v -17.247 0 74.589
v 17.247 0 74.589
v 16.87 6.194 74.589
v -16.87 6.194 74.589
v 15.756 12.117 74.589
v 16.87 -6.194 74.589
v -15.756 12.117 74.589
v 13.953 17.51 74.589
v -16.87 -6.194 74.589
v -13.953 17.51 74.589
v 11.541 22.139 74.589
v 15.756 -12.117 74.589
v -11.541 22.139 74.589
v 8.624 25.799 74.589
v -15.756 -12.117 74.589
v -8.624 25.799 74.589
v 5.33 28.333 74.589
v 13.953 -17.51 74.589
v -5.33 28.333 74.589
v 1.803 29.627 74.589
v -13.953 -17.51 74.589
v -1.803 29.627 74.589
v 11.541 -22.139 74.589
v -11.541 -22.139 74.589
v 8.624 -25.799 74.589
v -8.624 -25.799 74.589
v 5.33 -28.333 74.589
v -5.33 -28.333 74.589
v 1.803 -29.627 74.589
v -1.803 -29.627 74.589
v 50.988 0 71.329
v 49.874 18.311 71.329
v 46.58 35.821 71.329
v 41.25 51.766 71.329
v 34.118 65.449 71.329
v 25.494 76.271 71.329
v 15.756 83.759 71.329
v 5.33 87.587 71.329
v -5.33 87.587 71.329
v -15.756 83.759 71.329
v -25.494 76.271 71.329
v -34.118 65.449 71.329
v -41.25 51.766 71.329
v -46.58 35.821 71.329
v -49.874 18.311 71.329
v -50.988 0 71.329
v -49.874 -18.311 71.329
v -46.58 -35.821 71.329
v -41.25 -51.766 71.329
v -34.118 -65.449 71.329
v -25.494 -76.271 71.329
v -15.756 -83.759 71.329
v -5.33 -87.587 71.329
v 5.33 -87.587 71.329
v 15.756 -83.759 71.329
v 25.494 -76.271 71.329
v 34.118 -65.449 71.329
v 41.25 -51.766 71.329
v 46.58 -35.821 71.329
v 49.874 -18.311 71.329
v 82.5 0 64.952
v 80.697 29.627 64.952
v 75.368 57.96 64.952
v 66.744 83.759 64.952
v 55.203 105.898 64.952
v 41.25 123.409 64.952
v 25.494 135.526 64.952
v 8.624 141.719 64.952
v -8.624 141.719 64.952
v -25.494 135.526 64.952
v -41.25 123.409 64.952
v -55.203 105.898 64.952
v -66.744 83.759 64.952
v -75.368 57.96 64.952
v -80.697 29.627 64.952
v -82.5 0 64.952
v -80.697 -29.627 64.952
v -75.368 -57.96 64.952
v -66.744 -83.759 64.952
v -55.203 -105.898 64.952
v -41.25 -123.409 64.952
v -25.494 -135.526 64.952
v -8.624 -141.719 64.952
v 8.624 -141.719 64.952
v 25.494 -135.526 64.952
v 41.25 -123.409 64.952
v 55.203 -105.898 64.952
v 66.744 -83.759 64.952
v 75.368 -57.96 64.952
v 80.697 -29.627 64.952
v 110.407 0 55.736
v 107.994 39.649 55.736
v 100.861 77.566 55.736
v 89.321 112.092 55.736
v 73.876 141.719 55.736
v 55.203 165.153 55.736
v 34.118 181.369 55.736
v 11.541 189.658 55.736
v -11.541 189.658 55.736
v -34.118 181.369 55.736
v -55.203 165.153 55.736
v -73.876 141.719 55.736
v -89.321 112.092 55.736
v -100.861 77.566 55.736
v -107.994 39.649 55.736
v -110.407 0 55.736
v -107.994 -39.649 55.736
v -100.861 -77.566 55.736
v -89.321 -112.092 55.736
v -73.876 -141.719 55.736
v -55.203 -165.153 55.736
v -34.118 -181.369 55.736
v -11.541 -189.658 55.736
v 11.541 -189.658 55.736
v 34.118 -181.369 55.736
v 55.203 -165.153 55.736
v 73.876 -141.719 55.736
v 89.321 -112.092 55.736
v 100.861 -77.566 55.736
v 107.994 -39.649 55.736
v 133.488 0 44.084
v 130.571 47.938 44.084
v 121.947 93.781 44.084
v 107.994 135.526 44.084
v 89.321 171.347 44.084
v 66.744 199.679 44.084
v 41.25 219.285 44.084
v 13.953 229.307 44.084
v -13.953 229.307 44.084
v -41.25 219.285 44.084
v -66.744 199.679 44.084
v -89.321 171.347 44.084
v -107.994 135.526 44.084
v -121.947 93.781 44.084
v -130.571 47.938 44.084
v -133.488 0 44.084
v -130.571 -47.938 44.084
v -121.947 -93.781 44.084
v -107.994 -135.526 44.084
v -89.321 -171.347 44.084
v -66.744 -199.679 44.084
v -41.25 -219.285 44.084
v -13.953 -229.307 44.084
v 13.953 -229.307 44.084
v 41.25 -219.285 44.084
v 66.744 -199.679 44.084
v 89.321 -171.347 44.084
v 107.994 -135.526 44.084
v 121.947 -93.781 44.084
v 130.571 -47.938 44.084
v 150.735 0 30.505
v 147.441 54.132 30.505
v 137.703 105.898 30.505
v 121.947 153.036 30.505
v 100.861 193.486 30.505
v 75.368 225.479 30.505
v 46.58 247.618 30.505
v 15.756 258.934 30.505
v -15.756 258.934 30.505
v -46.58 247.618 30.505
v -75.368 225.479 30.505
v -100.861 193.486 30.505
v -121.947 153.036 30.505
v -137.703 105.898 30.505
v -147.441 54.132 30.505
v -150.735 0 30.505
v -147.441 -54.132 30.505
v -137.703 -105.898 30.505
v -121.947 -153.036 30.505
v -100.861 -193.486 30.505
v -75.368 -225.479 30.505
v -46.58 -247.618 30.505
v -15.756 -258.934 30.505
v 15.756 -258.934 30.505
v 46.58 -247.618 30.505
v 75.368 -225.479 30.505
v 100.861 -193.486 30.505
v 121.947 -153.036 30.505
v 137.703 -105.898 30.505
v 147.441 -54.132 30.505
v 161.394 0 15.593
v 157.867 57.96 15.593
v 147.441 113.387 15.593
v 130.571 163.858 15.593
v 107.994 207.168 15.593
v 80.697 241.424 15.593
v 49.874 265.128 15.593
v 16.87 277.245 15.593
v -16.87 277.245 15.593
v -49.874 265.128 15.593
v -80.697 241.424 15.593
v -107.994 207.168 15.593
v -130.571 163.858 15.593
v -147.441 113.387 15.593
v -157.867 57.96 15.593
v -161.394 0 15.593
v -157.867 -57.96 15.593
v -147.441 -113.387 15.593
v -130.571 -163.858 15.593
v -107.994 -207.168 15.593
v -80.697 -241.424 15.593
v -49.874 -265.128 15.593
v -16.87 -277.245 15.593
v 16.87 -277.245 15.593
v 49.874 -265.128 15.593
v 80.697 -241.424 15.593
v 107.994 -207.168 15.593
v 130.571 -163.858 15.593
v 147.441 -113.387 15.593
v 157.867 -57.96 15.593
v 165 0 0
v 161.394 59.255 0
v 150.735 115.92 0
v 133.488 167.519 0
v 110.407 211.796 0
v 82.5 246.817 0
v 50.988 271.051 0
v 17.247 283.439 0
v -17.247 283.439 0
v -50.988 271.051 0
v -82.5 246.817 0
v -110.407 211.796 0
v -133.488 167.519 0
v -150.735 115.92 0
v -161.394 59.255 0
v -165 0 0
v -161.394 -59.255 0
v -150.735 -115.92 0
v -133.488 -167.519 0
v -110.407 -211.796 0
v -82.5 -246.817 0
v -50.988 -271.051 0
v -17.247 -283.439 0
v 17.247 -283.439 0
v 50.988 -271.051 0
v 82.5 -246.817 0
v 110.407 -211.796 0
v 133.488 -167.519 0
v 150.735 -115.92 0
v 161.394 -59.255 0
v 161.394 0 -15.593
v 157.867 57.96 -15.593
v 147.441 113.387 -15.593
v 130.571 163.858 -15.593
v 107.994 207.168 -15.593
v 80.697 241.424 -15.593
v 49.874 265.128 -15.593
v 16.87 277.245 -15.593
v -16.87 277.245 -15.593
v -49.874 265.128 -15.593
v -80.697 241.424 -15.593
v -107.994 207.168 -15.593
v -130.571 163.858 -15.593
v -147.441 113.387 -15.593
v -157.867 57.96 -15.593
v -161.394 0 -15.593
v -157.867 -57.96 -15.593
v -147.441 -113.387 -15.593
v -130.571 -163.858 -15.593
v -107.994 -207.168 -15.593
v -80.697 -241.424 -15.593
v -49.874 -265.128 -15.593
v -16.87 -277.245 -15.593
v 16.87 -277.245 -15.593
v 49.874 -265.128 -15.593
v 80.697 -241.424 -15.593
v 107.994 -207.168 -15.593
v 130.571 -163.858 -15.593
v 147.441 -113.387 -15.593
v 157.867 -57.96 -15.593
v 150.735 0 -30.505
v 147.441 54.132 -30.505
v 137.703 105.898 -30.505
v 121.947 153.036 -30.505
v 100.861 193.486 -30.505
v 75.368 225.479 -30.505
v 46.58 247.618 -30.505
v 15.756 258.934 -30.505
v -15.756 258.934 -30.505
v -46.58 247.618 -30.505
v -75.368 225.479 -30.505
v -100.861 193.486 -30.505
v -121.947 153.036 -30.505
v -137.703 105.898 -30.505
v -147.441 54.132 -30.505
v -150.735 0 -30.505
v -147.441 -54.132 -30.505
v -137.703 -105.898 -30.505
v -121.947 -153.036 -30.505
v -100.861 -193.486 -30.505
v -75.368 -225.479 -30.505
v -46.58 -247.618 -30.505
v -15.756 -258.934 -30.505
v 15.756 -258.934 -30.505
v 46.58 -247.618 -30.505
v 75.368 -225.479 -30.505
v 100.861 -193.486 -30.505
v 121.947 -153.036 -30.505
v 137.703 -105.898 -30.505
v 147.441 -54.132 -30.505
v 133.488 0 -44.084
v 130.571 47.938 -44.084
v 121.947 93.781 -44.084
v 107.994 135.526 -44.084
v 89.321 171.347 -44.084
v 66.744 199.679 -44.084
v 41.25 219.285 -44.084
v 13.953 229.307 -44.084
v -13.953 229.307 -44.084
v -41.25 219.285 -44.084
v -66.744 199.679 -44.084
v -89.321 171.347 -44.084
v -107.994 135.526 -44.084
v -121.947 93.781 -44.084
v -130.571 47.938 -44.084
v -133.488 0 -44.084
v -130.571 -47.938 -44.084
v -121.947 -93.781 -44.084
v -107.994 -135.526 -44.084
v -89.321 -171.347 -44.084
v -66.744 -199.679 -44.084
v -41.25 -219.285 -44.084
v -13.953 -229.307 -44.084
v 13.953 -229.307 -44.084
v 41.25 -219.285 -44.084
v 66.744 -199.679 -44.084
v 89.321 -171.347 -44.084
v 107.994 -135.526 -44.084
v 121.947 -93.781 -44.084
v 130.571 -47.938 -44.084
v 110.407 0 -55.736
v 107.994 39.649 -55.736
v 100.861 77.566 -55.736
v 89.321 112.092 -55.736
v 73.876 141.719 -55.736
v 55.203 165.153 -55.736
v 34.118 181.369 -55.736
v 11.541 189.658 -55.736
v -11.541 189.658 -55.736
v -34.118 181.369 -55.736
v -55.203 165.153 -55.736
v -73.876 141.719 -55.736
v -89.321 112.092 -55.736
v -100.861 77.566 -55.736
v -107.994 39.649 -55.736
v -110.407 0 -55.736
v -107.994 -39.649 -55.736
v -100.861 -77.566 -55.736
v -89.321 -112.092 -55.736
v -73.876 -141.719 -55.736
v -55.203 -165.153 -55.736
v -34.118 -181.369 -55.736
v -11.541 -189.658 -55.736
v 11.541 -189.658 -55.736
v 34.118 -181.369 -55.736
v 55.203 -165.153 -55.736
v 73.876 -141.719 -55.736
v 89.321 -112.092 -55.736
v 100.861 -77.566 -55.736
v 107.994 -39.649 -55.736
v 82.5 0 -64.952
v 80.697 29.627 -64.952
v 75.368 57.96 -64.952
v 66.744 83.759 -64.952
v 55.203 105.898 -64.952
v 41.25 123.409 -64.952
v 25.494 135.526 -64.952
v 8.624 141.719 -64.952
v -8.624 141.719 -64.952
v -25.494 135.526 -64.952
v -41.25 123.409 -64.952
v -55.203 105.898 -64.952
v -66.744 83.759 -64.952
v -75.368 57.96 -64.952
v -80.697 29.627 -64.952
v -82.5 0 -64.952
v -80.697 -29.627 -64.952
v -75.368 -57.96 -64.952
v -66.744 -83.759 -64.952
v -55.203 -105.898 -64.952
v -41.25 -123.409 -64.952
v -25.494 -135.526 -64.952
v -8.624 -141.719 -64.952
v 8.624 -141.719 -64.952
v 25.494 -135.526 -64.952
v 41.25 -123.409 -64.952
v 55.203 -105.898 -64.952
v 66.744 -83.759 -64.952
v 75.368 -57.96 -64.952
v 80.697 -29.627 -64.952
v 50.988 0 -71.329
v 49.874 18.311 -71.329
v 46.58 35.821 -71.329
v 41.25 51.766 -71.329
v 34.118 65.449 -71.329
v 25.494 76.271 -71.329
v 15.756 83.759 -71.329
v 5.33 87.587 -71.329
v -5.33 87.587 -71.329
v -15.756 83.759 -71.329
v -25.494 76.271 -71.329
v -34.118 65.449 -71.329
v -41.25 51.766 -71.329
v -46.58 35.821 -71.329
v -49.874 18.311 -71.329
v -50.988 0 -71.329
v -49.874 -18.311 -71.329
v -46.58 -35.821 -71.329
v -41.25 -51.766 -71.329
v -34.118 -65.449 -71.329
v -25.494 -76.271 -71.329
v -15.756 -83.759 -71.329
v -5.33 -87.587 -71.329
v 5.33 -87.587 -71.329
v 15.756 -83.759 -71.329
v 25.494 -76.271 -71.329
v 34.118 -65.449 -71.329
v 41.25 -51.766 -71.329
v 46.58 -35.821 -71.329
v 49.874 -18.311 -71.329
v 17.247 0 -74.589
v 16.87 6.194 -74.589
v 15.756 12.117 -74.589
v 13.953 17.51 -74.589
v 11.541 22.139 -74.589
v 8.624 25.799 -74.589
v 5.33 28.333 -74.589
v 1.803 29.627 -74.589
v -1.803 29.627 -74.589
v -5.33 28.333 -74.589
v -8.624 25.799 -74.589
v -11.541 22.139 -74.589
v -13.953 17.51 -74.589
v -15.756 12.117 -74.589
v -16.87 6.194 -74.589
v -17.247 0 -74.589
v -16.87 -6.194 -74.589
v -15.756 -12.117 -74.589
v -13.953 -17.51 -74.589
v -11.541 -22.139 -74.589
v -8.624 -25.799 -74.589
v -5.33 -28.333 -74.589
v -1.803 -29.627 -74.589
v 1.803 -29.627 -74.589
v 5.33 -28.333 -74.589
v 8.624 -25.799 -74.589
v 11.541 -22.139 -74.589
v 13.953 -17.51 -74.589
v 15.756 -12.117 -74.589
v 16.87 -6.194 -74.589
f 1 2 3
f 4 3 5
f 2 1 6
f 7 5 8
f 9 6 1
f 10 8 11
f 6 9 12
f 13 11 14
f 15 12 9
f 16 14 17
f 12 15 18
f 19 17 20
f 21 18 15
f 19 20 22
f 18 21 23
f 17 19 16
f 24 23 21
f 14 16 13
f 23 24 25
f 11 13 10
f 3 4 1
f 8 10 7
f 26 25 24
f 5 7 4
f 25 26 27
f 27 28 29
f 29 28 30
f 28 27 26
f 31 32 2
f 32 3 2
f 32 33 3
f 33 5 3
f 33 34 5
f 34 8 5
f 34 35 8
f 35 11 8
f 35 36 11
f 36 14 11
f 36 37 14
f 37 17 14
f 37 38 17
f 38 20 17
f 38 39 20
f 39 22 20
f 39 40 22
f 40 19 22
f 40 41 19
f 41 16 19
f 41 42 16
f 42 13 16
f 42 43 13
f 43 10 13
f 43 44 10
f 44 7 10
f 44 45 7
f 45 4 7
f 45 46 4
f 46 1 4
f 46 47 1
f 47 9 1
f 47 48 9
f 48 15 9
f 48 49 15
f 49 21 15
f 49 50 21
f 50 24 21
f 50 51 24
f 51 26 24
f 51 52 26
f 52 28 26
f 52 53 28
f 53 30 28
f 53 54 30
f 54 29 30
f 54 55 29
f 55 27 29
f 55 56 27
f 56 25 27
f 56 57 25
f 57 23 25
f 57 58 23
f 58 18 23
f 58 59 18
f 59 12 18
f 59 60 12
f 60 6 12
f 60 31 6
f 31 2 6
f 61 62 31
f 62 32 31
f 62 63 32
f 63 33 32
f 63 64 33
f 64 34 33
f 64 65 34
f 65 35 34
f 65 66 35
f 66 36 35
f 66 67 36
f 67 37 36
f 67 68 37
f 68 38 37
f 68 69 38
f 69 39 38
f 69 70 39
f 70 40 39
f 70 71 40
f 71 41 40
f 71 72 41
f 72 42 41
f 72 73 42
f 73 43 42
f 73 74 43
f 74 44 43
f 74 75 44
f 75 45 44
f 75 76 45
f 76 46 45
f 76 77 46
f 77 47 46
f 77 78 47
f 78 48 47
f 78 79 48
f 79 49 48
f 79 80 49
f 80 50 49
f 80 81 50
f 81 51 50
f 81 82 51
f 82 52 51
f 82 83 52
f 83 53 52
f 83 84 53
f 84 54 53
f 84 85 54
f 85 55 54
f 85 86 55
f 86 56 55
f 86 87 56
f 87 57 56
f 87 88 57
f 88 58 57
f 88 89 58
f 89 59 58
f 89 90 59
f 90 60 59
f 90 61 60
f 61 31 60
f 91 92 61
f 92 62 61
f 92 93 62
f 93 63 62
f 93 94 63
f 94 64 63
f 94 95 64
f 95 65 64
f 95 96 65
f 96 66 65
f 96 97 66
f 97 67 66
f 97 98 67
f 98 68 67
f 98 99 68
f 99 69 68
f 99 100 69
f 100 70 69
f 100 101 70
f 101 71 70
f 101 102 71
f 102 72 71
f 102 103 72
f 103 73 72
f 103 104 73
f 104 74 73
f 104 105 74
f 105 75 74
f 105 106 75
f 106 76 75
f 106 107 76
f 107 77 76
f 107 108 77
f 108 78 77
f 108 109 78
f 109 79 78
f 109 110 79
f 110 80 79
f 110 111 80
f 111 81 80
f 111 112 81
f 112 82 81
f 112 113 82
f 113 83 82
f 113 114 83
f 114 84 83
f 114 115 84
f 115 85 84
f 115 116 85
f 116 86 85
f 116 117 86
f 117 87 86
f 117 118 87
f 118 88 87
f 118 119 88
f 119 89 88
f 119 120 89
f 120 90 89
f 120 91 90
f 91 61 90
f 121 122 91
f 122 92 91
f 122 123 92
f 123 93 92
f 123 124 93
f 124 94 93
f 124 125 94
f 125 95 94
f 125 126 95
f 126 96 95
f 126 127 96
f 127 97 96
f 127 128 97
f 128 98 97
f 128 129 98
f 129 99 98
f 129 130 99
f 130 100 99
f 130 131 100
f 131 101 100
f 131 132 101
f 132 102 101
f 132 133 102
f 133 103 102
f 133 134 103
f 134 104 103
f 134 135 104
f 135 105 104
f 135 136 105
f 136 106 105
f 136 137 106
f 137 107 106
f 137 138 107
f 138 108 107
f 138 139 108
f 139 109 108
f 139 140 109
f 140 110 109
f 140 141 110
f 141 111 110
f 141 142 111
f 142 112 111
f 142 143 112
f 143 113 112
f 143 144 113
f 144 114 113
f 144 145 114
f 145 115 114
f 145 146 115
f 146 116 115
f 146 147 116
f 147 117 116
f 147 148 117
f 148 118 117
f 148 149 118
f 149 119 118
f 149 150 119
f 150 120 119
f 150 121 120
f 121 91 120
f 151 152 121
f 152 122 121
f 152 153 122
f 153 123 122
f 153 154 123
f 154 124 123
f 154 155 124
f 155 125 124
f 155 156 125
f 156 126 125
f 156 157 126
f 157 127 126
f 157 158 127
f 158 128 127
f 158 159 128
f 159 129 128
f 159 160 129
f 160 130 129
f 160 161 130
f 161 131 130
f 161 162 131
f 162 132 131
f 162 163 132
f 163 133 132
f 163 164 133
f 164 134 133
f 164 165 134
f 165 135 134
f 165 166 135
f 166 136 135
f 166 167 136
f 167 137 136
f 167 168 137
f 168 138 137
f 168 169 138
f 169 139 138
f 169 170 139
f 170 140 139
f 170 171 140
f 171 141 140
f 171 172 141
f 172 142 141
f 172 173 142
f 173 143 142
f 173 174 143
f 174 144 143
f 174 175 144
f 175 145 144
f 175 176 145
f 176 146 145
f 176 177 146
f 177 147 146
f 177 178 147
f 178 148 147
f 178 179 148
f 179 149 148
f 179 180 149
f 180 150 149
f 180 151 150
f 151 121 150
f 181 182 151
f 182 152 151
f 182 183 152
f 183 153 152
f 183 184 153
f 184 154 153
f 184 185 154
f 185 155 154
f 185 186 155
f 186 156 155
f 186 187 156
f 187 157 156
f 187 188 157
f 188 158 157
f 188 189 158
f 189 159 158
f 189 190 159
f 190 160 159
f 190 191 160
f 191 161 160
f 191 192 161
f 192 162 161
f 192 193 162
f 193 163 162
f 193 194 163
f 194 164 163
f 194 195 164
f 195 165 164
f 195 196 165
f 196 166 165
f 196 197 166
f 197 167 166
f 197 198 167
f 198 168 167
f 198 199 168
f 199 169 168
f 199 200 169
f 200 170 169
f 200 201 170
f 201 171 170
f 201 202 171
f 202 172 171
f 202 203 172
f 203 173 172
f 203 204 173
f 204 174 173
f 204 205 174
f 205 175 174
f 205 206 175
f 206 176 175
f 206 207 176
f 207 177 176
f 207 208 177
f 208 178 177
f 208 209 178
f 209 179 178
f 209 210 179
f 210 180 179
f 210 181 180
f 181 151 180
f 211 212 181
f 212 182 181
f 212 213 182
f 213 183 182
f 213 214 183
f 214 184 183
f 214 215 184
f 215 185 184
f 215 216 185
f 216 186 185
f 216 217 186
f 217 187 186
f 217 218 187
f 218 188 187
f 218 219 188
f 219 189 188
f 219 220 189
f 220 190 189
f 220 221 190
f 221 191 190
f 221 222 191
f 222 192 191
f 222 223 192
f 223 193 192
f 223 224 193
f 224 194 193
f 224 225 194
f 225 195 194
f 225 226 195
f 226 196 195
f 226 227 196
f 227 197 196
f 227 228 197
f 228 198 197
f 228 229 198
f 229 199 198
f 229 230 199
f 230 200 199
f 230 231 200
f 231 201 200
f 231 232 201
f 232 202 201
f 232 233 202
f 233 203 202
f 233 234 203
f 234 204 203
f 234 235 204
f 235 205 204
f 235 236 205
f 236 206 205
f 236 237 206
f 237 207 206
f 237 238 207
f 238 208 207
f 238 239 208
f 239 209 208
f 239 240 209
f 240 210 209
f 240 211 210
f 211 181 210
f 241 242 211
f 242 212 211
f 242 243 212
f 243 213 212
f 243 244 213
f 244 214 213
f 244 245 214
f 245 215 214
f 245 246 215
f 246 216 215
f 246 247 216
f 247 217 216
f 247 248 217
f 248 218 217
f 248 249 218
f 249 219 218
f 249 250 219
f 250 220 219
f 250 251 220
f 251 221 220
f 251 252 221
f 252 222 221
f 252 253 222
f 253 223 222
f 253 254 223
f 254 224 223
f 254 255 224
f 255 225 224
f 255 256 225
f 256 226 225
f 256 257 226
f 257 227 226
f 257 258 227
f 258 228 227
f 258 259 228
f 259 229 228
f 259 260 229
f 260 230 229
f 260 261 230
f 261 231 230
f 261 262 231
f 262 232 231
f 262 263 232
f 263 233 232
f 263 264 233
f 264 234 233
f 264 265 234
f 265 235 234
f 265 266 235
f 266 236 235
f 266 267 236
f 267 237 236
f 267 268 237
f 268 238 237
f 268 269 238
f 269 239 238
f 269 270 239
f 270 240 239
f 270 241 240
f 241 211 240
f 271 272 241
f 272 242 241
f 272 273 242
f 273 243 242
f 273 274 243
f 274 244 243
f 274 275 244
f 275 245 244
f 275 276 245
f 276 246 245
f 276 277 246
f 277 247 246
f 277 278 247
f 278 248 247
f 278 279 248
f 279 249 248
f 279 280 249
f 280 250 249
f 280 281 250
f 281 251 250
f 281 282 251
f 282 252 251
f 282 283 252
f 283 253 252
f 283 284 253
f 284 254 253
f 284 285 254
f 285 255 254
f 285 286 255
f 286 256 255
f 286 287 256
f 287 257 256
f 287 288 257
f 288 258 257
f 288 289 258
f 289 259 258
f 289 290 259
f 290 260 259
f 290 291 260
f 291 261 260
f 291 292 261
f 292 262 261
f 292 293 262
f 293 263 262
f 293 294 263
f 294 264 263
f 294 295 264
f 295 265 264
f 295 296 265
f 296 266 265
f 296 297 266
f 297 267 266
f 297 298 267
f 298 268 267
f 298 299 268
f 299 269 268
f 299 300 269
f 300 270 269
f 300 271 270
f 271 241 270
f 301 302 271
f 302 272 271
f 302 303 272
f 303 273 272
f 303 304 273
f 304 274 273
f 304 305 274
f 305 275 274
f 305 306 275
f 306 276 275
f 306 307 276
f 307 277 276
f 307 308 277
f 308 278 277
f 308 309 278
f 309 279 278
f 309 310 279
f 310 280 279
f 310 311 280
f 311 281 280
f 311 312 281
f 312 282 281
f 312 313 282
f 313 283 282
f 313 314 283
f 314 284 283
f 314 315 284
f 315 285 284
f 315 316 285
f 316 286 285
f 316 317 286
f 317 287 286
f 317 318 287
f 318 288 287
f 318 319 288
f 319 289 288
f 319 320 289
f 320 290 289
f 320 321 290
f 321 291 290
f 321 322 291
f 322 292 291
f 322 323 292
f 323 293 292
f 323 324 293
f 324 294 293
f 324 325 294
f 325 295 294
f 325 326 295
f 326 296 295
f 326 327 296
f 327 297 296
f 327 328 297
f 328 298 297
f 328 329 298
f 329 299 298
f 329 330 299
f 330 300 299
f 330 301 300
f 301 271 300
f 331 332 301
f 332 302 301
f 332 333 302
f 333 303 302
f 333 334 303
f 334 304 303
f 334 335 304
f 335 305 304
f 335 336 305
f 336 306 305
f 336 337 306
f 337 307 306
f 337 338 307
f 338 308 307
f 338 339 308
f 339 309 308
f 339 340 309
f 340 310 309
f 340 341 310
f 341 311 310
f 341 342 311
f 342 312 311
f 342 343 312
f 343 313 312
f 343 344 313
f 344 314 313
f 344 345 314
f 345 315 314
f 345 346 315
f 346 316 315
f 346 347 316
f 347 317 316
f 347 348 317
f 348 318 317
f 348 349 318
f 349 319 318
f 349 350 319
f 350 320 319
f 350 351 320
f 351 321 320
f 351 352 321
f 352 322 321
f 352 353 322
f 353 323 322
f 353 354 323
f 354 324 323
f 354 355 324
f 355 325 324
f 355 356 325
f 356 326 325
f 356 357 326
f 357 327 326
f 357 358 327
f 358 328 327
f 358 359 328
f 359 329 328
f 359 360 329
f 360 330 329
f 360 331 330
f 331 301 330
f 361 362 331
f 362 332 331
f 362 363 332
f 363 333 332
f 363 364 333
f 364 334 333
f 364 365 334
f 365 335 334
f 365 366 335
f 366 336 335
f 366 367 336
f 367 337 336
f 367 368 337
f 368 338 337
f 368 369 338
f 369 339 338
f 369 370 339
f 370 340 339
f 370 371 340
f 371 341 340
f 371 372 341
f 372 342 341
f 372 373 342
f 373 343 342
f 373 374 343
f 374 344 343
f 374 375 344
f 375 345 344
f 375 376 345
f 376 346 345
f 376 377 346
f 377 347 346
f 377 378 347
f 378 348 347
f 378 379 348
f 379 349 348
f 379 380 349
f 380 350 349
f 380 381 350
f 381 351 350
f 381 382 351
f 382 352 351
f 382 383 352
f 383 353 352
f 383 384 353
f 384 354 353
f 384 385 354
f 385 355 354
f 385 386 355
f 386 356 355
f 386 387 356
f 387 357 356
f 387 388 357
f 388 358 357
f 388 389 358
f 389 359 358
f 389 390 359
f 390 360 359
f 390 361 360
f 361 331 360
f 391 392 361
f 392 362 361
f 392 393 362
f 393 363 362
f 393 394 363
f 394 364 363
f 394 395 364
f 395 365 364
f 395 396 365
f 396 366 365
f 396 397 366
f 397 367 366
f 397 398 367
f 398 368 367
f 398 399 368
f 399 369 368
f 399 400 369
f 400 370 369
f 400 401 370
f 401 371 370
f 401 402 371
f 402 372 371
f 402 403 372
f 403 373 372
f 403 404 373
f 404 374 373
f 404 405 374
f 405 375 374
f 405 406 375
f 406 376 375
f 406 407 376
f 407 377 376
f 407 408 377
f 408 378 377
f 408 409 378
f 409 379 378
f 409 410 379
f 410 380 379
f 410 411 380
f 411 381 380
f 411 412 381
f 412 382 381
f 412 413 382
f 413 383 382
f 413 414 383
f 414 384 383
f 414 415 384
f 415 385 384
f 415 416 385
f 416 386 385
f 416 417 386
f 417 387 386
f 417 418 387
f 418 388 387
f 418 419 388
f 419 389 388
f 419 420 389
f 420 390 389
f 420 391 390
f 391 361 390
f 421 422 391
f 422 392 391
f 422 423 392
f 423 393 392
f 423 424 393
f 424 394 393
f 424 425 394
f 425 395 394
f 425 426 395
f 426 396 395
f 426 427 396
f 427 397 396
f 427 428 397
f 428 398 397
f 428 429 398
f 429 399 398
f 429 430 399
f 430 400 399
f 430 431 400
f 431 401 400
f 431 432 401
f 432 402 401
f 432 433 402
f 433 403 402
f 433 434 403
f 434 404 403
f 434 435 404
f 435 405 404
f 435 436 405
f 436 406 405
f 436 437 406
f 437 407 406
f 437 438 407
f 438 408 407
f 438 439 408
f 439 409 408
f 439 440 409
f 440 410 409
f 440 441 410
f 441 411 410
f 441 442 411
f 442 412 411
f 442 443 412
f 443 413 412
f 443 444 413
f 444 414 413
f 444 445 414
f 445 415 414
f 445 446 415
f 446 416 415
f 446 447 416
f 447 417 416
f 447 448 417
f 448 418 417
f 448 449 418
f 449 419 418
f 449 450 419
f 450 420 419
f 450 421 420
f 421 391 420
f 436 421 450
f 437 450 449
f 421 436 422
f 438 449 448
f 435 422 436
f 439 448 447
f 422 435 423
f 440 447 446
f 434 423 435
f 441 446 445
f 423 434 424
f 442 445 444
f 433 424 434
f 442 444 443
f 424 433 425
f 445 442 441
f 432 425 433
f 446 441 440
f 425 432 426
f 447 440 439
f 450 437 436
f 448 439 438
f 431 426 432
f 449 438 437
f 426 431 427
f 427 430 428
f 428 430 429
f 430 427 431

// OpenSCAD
// Generated by SolidPython 1.0.1 on 2020-07-29 00:46:50


scale(v = [11, 19, 5]) {
	sphere(r = 15);
}
/***********************************************
*********      SolidPython code:      **********
************************************************
 
# import packages: SolidPython
from solid import *
from solid.utils import *
from itertools import chain, combinations, permutations


class Resize:

    def __init__(self, scad_file):
        self.scad_file = scad_file
        #self.scad_file = import_scad(scad_file)
        # cone/cylinder param:
        self.r1 = 0
        self.r2 = 0
        self.h = 0
        # rectangular prism param:
        self.w = 0
        self.l = 0
        # ellipse param:
        self.r = 0

    # import OpenScad code (file name corresponds to shape)


    # classify shape + parameters
    def assign(self, param1, param2, param3):
        if self.scad_file == 'cone.scad':
            self.r1 = param1
            self.r2 = param2
            self.h = param3
        elif self.scad_file == 'cylinder.scad':
            self.r1 = param1
            self.r2 = param2
            self.h = param3
        elif self.scad_file == 'rectangularPrism.scad':
            self.h = param1
            self.l = param2
            self.w = param3
        else:
            self.r = param1
            self.h = param2

    # resize parameters
    def iterate(self):
        x = range(3, 20, 2)
        i = 1
        if self.scad_file == 'cone.scad':
            tempList = list(permutations(x, 2))
            for temp in tempList:
                param1 = temp[0]
                param2 = temp[1]
                filepath = 'produced_scad_files/' + 'cone' + str(param1) + '_' + str(param2) + '_' + '.scad'
                scad_render_to_file(cylinder(h=param1, r1=param2, r2=0), filepath)

        elif self.scad_file == 'cylinder.scad':
            tempList = list(permutations(x, 3))
            for temp in tempList:
                param1 = temp[0]
                param2 = temp[1]
                filepath = 'produced_scad_files/' + 'cylinder' + str(param1) + '_' + str(param2) + '_' + '.scad'
                scad_render_to_file(cylinder(h=param1, r1=param2, r2=param2), filepath)

        elif self.scad_file == 'rectangularPrism.scad':
            tempList = list(permutations(x, 3))
            for temp in tempList:
                param1 = temp[0]
                param2 = temp[1]
                param3 = temp[2]
                filepath = 'produced_scad_files/' + 'rectangularPrism' + str(param1) + '_' + str(param2) + '_' + str(
                    param3) + '.scad'
                scad_render_to_file(cube(size=(param1, param2, param3)), filepath)

        elif self.scad_file == 'ellipse.scad':
            tempList = list(permutations(x, 4))
            for temp in tempList:
                param1 = temp[0]
                param2 = temp[1]
                param3 = temp[2]
                param4 = temp[3]
                filepath = 'produced_scad_files/' + 'ellipse' + str(param1) + '_' + str(param2) + '_' + str(param3) + '_' + str(param4) + '.scad'
                scad_render_to_file(scale([param1, param2, param3])(sphere(r=param4)), filepath)

    def render_to_scadfile(self):
        scad_render_to_file(scad, 'example.scad') 
 
************************************************/
